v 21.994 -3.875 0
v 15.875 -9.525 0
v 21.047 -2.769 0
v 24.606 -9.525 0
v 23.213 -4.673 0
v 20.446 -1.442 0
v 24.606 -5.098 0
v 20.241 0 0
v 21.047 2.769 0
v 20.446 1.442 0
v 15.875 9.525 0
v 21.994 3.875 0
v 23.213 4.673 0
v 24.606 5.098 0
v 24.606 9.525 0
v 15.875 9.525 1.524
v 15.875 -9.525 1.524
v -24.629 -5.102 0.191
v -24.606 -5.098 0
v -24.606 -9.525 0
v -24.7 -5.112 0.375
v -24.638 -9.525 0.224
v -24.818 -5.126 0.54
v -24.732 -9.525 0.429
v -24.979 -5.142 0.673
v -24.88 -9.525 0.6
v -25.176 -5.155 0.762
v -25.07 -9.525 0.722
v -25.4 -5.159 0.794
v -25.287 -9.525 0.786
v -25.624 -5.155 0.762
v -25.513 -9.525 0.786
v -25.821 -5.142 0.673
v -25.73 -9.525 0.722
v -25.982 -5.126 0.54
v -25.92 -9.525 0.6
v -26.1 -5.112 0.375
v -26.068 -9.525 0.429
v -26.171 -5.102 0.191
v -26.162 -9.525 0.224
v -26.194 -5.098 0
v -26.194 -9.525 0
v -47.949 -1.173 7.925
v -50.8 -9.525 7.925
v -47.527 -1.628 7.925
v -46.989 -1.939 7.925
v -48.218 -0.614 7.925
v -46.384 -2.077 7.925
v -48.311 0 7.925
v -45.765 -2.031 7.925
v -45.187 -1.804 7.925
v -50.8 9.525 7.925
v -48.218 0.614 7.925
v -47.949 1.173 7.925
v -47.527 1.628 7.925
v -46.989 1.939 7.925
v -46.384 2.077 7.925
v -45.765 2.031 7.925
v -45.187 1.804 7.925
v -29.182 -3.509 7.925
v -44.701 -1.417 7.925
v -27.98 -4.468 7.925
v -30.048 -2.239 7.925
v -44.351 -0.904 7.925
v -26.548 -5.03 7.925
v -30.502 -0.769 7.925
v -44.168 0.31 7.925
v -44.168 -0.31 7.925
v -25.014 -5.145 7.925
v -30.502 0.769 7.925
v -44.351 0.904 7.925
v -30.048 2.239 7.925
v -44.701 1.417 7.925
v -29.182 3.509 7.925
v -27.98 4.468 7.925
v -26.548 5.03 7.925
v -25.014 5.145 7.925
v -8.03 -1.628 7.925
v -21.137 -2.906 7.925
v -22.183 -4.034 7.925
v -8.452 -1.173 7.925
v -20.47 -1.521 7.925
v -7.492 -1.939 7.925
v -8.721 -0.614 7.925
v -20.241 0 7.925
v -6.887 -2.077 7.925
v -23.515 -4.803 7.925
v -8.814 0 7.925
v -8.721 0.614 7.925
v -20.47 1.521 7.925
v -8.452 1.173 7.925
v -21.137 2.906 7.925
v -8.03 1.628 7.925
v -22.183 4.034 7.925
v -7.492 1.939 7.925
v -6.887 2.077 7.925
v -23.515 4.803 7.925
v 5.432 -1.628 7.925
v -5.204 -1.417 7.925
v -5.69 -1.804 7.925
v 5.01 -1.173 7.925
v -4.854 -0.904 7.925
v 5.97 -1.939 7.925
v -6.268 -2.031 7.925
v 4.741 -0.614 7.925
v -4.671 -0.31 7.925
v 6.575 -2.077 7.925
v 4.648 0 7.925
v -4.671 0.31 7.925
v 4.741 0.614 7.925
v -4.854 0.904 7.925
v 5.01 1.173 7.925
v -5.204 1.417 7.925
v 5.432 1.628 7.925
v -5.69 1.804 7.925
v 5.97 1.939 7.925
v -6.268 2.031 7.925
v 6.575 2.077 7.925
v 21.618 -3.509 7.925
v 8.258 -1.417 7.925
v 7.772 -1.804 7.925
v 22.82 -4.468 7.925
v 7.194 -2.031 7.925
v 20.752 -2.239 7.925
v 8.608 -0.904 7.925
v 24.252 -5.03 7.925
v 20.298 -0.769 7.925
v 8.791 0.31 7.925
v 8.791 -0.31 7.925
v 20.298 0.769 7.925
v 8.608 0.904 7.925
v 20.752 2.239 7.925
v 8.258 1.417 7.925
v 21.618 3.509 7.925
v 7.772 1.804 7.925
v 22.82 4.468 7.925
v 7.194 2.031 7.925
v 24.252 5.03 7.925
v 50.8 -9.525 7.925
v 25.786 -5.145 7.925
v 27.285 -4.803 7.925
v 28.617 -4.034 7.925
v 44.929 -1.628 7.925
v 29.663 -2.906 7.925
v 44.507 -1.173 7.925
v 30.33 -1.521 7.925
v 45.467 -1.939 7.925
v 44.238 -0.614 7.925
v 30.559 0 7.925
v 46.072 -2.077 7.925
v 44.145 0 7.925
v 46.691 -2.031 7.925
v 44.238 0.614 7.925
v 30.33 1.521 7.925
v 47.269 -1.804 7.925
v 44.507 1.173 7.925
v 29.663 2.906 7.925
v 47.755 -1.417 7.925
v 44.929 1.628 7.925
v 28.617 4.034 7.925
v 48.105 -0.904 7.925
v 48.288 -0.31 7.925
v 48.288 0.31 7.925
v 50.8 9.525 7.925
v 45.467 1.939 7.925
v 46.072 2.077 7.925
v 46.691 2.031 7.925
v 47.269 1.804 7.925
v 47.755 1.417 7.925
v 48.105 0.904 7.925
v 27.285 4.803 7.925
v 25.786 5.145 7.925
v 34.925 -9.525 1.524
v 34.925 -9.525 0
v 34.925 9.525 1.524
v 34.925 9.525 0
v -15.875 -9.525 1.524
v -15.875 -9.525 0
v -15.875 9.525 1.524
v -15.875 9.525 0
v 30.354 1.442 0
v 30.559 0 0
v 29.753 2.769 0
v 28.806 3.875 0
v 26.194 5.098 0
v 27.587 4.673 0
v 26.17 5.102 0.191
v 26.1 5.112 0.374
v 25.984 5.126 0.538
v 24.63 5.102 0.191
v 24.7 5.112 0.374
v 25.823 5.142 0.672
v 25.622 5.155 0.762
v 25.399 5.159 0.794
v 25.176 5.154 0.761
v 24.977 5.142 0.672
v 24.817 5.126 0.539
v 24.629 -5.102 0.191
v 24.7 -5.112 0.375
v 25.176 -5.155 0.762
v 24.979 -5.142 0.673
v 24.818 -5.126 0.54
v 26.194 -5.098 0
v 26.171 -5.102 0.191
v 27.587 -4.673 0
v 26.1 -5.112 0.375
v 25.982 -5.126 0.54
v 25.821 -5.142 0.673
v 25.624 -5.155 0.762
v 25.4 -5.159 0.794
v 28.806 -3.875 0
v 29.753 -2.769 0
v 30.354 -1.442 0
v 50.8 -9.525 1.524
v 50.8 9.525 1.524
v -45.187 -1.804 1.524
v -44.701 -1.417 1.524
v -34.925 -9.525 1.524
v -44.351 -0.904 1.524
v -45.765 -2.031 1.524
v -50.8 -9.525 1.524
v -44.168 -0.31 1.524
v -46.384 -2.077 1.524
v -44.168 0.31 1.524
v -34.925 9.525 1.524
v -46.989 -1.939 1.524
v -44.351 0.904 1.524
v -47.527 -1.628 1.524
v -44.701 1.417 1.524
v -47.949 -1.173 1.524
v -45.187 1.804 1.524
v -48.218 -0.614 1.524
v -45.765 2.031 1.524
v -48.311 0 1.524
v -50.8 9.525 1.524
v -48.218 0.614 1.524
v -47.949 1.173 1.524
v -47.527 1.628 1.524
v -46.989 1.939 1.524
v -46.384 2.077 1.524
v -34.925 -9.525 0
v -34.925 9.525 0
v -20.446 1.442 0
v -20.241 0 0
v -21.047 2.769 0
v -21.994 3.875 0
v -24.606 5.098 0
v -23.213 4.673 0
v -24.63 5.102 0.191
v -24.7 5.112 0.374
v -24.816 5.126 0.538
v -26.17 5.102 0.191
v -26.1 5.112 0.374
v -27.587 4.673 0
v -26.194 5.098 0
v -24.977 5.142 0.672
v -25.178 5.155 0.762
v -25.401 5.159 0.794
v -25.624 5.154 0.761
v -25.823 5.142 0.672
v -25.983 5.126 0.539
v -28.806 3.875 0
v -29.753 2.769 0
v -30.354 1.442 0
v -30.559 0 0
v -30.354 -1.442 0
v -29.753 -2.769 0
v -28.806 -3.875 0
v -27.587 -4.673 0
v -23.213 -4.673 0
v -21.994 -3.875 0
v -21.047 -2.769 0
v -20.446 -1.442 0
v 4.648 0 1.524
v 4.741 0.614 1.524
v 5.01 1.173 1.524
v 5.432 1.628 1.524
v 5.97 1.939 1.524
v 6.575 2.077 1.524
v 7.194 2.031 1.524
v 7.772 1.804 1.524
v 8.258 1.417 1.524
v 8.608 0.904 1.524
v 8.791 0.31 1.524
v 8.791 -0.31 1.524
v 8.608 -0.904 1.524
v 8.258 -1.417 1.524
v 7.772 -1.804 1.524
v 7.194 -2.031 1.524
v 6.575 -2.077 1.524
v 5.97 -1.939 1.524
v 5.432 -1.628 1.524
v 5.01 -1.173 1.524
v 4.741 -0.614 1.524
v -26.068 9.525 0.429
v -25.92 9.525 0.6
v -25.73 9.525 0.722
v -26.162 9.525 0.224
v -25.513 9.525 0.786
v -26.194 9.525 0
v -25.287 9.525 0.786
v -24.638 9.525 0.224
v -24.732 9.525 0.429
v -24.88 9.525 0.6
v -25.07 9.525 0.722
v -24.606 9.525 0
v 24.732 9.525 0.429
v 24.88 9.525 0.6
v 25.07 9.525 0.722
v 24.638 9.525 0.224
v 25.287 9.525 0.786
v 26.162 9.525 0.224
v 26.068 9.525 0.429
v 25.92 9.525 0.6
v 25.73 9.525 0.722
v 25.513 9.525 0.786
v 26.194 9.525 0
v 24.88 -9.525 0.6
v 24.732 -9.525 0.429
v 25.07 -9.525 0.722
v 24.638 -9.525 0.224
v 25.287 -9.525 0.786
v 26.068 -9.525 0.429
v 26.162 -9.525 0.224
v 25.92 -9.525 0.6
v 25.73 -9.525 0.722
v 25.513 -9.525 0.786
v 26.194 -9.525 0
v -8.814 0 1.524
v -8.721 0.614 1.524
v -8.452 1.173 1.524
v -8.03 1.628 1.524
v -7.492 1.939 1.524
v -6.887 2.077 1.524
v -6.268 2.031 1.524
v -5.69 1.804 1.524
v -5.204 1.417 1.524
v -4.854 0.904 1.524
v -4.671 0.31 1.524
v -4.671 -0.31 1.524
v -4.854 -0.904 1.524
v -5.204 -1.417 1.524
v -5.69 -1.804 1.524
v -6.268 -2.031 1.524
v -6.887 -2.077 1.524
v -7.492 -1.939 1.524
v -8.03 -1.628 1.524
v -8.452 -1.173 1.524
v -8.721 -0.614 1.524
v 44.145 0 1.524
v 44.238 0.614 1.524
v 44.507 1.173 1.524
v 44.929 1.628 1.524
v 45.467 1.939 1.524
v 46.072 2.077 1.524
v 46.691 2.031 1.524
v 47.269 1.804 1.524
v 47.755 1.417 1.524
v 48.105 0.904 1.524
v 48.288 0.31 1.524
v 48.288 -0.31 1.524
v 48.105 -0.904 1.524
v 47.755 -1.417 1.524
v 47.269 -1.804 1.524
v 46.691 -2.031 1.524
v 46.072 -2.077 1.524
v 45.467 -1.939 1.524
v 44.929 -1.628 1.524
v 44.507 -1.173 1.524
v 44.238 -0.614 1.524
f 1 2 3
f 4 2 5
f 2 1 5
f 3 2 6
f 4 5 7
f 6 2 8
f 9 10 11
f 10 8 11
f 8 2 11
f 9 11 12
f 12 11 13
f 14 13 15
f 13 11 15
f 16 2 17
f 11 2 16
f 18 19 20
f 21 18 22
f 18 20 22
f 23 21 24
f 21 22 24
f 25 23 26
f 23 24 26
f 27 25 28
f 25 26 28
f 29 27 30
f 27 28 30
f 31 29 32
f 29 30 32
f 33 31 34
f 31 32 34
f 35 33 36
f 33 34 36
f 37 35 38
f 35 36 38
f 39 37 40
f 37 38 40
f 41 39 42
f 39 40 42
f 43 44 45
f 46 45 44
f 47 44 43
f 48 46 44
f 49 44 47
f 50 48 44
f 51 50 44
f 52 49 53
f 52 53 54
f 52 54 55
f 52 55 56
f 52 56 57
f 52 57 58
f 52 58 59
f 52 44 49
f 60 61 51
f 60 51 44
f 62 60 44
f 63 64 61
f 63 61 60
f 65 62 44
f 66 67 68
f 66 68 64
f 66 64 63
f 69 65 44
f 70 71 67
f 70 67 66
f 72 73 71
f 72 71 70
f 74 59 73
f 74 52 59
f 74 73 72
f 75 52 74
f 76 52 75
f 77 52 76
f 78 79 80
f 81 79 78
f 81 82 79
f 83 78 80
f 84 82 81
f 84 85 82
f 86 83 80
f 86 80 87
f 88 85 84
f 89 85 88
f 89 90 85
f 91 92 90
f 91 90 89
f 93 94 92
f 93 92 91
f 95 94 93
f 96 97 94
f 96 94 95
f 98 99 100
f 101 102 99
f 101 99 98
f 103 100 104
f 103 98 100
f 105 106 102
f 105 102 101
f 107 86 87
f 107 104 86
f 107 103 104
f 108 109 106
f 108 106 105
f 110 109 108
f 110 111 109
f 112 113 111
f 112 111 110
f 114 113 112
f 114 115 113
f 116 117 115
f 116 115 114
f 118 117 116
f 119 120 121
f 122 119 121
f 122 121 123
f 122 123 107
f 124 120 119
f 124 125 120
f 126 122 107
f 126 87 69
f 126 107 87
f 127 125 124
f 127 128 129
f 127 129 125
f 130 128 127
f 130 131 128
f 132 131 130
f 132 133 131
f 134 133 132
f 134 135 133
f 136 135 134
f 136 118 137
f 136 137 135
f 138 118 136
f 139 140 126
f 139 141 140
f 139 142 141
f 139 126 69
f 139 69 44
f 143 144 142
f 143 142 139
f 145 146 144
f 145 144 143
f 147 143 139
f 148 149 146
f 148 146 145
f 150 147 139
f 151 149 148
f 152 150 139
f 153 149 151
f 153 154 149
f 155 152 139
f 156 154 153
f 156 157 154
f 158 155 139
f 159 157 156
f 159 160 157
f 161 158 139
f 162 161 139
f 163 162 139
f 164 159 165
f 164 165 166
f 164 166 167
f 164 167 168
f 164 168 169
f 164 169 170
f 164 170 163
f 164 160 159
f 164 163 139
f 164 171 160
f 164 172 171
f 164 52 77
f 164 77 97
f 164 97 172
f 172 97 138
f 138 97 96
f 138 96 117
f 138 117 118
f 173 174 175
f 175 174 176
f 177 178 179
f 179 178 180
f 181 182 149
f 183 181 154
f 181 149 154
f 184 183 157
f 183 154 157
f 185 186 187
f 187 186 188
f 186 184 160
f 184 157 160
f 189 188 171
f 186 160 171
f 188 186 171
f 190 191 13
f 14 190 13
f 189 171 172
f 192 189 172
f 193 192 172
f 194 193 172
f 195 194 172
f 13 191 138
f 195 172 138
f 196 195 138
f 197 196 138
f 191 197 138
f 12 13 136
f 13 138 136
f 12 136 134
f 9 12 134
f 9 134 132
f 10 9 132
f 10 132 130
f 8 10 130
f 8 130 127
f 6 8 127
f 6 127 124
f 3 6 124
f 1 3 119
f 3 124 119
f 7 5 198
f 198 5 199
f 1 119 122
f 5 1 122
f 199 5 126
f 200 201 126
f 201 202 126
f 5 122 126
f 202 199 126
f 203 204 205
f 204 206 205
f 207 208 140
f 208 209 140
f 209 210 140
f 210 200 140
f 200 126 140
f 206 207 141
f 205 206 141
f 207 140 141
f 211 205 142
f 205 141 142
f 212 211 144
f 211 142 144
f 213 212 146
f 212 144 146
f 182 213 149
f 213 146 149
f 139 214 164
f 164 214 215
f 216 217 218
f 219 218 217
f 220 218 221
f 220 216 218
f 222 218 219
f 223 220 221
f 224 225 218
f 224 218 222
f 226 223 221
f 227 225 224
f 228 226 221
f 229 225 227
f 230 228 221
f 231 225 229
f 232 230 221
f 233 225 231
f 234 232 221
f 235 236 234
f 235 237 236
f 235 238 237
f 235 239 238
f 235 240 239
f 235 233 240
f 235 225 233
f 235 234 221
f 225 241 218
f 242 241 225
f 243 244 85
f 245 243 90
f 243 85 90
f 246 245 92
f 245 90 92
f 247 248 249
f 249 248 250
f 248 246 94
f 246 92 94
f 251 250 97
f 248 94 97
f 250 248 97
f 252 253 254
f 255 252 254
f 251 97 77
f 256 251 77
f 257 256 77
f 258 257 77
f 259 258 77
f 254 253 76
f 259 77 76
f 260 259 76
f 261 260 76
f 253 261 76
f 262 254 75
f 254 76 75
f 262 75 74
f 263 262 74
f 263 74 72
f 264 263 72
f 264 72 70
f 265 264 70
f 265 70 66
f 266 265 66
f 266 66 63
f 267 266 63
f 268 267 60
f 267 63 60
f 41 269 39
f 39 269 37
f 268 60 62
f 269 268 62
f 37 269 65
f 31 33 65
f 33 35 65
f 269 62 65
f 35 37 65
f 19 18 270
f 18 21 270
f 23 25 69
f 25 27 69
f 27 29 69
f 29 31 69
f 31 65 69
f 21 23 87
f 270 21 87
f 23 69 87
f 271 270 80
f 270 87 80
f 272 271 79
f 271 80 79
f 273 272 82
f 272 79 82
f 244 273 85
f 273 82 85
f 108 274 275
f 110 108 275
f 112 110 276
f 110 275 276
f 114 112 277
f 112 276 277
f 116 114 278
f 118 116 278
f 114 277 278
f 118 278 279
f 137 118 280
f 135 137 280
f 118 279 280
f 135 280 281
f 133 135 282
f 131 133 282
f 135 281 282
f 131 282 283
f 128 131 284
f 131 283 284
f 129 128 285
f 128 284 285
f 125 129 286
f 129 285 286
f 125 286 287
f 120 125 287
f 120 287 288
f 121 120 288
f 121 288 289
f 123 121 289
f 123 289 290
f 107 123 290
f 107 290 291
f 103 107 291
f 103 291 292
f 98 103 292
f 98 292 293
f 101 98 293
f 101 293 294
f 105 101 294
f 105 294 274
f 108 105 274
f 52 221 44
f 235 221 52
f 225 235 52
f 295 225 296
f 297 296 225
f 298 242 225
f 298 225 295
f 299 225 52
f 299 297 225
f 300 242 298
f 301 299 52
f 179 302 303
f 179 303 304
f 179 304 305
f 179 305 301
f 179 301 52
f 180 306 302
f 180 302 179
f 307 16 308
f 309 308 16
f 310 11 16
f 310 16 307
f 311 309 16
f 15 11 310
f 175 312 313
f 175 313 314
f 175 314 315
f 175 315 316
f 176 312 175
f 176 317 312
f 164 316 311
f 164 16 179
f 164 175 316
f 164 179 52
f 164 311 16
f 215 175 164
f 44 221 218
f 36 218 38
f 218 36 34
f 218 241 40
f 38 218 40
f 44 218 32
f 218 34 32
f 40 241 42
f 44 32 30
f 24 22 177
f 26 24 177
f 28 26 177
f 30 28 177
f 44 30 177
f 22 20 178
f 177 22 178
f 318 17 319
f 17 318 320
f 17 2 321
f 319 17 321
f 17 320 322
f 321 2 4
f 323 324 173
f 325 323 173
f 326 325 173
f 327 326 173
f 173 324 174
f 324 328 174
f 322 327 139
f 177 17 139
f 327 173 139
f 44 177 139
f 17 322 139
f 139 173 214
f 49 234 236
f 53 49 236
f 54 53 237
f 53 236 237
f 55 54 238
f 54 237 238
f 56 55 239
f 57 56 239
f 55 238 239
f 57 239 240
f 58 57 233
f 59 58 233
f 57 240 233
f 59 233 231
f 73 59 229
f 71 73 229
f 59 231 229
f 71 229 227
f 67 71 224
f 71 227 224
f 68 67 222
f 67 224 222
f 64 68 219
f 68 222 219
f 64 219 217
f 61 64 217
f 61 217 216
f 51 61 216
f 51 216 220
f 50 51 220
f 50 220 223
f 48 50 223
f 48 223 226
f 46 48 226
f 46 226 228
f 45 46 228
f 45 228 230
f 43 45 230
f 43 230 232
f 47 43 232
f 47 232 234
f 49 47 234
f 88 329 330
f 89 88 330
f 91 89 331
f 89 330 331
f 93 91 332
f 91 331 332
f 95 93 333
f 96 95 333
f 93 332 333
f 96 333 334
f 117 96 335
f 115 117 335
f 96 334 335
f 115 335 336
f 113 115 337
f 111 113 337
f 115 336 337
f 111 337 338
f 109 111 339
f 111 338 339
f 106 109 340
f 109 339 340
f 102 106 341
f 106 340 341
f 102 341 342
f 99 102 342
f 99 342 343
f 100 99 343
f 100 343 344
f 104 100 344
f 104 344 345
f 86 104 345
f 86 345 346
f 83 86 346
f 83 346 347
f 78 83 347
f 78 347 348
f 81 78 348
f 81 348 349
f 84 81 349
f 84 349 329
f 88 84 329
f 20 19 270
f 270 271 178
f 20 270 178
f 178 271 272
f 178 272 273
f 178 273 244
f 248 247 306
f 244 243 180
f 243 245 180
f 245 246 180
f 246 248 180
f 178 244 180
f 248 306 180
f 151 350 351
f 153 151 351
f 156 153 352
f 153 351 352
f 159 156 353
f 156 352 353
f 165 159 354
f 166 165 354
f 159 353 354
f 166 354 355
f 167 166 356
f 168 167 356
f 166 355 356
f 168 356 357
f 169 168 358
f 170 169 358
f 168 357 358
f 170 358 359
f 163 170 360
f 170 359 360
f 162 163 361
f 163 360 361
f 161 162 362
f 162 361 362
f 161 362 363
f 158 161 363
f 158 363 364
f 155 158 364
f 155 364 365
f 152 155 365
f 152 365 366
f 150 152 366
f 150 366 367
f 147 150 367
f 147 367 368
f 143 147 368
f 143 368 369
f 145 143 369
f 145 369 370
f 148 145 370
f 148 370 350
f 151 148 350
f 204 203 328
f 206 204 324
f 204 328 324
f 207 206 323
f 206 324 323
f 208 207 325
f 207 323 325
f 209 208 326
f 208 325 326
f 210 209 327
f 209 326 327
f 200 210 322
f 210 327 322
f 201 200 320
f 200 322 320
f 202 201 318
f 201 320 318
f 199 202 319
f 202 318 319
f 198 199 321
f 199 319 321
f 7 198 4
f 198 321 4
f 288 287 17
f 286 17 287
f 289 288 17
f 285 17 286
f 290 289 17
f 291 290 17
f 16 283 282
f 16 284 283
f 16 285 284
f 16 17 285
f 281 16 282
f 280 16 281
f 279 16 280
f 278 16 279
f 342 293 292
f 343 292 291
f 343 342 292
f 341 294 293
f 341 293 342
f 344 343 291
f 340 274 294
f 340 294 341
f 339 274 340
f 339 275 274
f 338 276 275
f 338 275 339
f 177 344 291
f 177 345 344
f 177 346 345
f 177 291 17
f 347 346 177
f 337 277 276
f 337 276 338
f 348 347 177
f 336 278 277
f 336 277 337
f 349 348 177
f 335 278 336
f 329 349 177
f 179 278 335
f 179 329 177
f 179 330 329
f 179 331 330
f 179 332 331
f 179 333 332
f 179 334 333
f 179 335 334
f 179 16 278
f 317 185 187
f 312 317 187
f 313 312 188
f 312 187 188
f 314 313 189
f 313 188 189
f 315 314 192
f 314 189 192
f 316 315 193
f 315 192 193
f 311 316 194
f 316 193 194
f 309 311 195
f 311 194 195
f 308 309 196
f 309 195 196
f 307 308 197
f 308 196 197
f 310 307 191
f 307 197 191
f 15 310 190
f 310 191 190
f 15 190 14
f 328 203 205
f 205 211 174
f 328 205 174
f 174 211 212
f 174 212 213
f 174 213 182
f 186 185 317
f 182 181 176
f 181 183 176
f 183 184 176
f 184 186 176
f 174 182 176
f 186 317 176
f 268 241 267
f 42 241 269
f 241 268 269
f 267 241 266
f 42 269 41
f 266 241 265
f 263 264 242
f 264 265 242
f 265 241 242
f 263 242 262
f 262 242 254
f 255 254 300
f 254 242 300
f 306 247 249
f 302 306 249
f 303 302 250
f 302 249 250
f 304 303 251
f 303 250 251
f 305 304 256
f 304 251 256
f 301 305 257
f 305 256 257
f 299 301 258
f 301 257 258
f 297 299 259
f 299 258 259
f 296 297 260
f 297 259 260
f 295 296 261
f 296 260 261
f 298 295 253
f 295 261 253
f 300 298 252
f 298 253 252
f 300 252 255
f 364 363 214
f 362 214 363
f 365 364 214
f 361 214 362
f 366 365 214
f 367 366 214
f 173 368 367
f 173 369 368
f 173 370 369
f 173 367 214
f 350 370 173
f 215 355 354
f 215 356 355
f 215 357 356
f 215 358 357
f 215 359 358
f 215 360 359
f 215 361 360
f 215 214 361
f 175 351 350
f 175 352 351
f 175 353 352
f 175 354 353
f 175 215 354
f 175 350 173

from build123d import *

# Parameters (mm, degrees)
SKETCH1_W                        = 101.6
SKETCH1_H                        = 19.05
EXTRUDE1_DEPTH                   = 7.9248
F_13_32_0_40625_DIAMETER_HOLE1_D = 10.31875
F_8_32_TAPPED_HOLE1_D            = 4.1656
SKETCH9_W                        = 31.75
SKETCH9_H                        = 19.05
SKETCH9_W_2                      = 15.875
EXTRUDE3_DEPTH                   = 1.524
F_1_16_0_0625_DIAMETER_HOLE1_D   = 1.5875


with BuildPart() as part:
    # Sketch1 → Extrude1 (new body)
    with BuildSketch(Plane.XY):
        Rectangle(SKETCH1_W, SKETCH1_H)
    extrude(amount=EXTRUDE1_DEPTH)

    # 13/32 (0.40625) Diameter Hole1 (through all)
    with Locations(Plane(origin=(0, 0, 0), x_dir=(-1, 0, 0), z_dir=(0, 0, -1))):
        with Locations((25.4, 0), (-25.4, 0)):
            Hole(F_13_32_0_40625_DIAMETER_HOLE1_D / 2)

    # #8-32 Tapped Hole1 (through all)
    with Locations(Plane.XY.offset(7.9248)):
        with Locations((-46.228, 0), (-6.731, 0), (6.731, 0), (46.228, 0)):
            Hole(F_8_32_TAPPED_HOLE1_D / 2)

    # Sketch9 → Extrude3 (cut)
    with BuildSketch(Plane(origin=(0, 0, 0), x_dir=(-1, 0, 0), z_dir=(0, 0, -1))):
        Rectangle(SKETCH9_W, SKETCH9_H)
        with Locations((-42.8625, 0)):
            Rectangle(SKETCH9_W_2, SKETCH9_H)
        with Locations((42.8625, 0)):
            Rectangle(SKETCH9_W_2, SKETCH9_H)
    extrude(amount=-EXTRUDE3_DEPTH, mode=Mode.SUBTRACT)

    # 1/16 (0.0625) Diameter Hole1 (through all)
    with Locations(Plane(origin=(0, 9.525, 0), x_dir=(-1, 0, 0), z_dir=(0, 1, 0))):
        with Locations((-25.4, 0), (25.4, 0)):
            Hole(F_1_16_0_0625_DIAMETER_HOLE1_D / 2)


solid = part.part
